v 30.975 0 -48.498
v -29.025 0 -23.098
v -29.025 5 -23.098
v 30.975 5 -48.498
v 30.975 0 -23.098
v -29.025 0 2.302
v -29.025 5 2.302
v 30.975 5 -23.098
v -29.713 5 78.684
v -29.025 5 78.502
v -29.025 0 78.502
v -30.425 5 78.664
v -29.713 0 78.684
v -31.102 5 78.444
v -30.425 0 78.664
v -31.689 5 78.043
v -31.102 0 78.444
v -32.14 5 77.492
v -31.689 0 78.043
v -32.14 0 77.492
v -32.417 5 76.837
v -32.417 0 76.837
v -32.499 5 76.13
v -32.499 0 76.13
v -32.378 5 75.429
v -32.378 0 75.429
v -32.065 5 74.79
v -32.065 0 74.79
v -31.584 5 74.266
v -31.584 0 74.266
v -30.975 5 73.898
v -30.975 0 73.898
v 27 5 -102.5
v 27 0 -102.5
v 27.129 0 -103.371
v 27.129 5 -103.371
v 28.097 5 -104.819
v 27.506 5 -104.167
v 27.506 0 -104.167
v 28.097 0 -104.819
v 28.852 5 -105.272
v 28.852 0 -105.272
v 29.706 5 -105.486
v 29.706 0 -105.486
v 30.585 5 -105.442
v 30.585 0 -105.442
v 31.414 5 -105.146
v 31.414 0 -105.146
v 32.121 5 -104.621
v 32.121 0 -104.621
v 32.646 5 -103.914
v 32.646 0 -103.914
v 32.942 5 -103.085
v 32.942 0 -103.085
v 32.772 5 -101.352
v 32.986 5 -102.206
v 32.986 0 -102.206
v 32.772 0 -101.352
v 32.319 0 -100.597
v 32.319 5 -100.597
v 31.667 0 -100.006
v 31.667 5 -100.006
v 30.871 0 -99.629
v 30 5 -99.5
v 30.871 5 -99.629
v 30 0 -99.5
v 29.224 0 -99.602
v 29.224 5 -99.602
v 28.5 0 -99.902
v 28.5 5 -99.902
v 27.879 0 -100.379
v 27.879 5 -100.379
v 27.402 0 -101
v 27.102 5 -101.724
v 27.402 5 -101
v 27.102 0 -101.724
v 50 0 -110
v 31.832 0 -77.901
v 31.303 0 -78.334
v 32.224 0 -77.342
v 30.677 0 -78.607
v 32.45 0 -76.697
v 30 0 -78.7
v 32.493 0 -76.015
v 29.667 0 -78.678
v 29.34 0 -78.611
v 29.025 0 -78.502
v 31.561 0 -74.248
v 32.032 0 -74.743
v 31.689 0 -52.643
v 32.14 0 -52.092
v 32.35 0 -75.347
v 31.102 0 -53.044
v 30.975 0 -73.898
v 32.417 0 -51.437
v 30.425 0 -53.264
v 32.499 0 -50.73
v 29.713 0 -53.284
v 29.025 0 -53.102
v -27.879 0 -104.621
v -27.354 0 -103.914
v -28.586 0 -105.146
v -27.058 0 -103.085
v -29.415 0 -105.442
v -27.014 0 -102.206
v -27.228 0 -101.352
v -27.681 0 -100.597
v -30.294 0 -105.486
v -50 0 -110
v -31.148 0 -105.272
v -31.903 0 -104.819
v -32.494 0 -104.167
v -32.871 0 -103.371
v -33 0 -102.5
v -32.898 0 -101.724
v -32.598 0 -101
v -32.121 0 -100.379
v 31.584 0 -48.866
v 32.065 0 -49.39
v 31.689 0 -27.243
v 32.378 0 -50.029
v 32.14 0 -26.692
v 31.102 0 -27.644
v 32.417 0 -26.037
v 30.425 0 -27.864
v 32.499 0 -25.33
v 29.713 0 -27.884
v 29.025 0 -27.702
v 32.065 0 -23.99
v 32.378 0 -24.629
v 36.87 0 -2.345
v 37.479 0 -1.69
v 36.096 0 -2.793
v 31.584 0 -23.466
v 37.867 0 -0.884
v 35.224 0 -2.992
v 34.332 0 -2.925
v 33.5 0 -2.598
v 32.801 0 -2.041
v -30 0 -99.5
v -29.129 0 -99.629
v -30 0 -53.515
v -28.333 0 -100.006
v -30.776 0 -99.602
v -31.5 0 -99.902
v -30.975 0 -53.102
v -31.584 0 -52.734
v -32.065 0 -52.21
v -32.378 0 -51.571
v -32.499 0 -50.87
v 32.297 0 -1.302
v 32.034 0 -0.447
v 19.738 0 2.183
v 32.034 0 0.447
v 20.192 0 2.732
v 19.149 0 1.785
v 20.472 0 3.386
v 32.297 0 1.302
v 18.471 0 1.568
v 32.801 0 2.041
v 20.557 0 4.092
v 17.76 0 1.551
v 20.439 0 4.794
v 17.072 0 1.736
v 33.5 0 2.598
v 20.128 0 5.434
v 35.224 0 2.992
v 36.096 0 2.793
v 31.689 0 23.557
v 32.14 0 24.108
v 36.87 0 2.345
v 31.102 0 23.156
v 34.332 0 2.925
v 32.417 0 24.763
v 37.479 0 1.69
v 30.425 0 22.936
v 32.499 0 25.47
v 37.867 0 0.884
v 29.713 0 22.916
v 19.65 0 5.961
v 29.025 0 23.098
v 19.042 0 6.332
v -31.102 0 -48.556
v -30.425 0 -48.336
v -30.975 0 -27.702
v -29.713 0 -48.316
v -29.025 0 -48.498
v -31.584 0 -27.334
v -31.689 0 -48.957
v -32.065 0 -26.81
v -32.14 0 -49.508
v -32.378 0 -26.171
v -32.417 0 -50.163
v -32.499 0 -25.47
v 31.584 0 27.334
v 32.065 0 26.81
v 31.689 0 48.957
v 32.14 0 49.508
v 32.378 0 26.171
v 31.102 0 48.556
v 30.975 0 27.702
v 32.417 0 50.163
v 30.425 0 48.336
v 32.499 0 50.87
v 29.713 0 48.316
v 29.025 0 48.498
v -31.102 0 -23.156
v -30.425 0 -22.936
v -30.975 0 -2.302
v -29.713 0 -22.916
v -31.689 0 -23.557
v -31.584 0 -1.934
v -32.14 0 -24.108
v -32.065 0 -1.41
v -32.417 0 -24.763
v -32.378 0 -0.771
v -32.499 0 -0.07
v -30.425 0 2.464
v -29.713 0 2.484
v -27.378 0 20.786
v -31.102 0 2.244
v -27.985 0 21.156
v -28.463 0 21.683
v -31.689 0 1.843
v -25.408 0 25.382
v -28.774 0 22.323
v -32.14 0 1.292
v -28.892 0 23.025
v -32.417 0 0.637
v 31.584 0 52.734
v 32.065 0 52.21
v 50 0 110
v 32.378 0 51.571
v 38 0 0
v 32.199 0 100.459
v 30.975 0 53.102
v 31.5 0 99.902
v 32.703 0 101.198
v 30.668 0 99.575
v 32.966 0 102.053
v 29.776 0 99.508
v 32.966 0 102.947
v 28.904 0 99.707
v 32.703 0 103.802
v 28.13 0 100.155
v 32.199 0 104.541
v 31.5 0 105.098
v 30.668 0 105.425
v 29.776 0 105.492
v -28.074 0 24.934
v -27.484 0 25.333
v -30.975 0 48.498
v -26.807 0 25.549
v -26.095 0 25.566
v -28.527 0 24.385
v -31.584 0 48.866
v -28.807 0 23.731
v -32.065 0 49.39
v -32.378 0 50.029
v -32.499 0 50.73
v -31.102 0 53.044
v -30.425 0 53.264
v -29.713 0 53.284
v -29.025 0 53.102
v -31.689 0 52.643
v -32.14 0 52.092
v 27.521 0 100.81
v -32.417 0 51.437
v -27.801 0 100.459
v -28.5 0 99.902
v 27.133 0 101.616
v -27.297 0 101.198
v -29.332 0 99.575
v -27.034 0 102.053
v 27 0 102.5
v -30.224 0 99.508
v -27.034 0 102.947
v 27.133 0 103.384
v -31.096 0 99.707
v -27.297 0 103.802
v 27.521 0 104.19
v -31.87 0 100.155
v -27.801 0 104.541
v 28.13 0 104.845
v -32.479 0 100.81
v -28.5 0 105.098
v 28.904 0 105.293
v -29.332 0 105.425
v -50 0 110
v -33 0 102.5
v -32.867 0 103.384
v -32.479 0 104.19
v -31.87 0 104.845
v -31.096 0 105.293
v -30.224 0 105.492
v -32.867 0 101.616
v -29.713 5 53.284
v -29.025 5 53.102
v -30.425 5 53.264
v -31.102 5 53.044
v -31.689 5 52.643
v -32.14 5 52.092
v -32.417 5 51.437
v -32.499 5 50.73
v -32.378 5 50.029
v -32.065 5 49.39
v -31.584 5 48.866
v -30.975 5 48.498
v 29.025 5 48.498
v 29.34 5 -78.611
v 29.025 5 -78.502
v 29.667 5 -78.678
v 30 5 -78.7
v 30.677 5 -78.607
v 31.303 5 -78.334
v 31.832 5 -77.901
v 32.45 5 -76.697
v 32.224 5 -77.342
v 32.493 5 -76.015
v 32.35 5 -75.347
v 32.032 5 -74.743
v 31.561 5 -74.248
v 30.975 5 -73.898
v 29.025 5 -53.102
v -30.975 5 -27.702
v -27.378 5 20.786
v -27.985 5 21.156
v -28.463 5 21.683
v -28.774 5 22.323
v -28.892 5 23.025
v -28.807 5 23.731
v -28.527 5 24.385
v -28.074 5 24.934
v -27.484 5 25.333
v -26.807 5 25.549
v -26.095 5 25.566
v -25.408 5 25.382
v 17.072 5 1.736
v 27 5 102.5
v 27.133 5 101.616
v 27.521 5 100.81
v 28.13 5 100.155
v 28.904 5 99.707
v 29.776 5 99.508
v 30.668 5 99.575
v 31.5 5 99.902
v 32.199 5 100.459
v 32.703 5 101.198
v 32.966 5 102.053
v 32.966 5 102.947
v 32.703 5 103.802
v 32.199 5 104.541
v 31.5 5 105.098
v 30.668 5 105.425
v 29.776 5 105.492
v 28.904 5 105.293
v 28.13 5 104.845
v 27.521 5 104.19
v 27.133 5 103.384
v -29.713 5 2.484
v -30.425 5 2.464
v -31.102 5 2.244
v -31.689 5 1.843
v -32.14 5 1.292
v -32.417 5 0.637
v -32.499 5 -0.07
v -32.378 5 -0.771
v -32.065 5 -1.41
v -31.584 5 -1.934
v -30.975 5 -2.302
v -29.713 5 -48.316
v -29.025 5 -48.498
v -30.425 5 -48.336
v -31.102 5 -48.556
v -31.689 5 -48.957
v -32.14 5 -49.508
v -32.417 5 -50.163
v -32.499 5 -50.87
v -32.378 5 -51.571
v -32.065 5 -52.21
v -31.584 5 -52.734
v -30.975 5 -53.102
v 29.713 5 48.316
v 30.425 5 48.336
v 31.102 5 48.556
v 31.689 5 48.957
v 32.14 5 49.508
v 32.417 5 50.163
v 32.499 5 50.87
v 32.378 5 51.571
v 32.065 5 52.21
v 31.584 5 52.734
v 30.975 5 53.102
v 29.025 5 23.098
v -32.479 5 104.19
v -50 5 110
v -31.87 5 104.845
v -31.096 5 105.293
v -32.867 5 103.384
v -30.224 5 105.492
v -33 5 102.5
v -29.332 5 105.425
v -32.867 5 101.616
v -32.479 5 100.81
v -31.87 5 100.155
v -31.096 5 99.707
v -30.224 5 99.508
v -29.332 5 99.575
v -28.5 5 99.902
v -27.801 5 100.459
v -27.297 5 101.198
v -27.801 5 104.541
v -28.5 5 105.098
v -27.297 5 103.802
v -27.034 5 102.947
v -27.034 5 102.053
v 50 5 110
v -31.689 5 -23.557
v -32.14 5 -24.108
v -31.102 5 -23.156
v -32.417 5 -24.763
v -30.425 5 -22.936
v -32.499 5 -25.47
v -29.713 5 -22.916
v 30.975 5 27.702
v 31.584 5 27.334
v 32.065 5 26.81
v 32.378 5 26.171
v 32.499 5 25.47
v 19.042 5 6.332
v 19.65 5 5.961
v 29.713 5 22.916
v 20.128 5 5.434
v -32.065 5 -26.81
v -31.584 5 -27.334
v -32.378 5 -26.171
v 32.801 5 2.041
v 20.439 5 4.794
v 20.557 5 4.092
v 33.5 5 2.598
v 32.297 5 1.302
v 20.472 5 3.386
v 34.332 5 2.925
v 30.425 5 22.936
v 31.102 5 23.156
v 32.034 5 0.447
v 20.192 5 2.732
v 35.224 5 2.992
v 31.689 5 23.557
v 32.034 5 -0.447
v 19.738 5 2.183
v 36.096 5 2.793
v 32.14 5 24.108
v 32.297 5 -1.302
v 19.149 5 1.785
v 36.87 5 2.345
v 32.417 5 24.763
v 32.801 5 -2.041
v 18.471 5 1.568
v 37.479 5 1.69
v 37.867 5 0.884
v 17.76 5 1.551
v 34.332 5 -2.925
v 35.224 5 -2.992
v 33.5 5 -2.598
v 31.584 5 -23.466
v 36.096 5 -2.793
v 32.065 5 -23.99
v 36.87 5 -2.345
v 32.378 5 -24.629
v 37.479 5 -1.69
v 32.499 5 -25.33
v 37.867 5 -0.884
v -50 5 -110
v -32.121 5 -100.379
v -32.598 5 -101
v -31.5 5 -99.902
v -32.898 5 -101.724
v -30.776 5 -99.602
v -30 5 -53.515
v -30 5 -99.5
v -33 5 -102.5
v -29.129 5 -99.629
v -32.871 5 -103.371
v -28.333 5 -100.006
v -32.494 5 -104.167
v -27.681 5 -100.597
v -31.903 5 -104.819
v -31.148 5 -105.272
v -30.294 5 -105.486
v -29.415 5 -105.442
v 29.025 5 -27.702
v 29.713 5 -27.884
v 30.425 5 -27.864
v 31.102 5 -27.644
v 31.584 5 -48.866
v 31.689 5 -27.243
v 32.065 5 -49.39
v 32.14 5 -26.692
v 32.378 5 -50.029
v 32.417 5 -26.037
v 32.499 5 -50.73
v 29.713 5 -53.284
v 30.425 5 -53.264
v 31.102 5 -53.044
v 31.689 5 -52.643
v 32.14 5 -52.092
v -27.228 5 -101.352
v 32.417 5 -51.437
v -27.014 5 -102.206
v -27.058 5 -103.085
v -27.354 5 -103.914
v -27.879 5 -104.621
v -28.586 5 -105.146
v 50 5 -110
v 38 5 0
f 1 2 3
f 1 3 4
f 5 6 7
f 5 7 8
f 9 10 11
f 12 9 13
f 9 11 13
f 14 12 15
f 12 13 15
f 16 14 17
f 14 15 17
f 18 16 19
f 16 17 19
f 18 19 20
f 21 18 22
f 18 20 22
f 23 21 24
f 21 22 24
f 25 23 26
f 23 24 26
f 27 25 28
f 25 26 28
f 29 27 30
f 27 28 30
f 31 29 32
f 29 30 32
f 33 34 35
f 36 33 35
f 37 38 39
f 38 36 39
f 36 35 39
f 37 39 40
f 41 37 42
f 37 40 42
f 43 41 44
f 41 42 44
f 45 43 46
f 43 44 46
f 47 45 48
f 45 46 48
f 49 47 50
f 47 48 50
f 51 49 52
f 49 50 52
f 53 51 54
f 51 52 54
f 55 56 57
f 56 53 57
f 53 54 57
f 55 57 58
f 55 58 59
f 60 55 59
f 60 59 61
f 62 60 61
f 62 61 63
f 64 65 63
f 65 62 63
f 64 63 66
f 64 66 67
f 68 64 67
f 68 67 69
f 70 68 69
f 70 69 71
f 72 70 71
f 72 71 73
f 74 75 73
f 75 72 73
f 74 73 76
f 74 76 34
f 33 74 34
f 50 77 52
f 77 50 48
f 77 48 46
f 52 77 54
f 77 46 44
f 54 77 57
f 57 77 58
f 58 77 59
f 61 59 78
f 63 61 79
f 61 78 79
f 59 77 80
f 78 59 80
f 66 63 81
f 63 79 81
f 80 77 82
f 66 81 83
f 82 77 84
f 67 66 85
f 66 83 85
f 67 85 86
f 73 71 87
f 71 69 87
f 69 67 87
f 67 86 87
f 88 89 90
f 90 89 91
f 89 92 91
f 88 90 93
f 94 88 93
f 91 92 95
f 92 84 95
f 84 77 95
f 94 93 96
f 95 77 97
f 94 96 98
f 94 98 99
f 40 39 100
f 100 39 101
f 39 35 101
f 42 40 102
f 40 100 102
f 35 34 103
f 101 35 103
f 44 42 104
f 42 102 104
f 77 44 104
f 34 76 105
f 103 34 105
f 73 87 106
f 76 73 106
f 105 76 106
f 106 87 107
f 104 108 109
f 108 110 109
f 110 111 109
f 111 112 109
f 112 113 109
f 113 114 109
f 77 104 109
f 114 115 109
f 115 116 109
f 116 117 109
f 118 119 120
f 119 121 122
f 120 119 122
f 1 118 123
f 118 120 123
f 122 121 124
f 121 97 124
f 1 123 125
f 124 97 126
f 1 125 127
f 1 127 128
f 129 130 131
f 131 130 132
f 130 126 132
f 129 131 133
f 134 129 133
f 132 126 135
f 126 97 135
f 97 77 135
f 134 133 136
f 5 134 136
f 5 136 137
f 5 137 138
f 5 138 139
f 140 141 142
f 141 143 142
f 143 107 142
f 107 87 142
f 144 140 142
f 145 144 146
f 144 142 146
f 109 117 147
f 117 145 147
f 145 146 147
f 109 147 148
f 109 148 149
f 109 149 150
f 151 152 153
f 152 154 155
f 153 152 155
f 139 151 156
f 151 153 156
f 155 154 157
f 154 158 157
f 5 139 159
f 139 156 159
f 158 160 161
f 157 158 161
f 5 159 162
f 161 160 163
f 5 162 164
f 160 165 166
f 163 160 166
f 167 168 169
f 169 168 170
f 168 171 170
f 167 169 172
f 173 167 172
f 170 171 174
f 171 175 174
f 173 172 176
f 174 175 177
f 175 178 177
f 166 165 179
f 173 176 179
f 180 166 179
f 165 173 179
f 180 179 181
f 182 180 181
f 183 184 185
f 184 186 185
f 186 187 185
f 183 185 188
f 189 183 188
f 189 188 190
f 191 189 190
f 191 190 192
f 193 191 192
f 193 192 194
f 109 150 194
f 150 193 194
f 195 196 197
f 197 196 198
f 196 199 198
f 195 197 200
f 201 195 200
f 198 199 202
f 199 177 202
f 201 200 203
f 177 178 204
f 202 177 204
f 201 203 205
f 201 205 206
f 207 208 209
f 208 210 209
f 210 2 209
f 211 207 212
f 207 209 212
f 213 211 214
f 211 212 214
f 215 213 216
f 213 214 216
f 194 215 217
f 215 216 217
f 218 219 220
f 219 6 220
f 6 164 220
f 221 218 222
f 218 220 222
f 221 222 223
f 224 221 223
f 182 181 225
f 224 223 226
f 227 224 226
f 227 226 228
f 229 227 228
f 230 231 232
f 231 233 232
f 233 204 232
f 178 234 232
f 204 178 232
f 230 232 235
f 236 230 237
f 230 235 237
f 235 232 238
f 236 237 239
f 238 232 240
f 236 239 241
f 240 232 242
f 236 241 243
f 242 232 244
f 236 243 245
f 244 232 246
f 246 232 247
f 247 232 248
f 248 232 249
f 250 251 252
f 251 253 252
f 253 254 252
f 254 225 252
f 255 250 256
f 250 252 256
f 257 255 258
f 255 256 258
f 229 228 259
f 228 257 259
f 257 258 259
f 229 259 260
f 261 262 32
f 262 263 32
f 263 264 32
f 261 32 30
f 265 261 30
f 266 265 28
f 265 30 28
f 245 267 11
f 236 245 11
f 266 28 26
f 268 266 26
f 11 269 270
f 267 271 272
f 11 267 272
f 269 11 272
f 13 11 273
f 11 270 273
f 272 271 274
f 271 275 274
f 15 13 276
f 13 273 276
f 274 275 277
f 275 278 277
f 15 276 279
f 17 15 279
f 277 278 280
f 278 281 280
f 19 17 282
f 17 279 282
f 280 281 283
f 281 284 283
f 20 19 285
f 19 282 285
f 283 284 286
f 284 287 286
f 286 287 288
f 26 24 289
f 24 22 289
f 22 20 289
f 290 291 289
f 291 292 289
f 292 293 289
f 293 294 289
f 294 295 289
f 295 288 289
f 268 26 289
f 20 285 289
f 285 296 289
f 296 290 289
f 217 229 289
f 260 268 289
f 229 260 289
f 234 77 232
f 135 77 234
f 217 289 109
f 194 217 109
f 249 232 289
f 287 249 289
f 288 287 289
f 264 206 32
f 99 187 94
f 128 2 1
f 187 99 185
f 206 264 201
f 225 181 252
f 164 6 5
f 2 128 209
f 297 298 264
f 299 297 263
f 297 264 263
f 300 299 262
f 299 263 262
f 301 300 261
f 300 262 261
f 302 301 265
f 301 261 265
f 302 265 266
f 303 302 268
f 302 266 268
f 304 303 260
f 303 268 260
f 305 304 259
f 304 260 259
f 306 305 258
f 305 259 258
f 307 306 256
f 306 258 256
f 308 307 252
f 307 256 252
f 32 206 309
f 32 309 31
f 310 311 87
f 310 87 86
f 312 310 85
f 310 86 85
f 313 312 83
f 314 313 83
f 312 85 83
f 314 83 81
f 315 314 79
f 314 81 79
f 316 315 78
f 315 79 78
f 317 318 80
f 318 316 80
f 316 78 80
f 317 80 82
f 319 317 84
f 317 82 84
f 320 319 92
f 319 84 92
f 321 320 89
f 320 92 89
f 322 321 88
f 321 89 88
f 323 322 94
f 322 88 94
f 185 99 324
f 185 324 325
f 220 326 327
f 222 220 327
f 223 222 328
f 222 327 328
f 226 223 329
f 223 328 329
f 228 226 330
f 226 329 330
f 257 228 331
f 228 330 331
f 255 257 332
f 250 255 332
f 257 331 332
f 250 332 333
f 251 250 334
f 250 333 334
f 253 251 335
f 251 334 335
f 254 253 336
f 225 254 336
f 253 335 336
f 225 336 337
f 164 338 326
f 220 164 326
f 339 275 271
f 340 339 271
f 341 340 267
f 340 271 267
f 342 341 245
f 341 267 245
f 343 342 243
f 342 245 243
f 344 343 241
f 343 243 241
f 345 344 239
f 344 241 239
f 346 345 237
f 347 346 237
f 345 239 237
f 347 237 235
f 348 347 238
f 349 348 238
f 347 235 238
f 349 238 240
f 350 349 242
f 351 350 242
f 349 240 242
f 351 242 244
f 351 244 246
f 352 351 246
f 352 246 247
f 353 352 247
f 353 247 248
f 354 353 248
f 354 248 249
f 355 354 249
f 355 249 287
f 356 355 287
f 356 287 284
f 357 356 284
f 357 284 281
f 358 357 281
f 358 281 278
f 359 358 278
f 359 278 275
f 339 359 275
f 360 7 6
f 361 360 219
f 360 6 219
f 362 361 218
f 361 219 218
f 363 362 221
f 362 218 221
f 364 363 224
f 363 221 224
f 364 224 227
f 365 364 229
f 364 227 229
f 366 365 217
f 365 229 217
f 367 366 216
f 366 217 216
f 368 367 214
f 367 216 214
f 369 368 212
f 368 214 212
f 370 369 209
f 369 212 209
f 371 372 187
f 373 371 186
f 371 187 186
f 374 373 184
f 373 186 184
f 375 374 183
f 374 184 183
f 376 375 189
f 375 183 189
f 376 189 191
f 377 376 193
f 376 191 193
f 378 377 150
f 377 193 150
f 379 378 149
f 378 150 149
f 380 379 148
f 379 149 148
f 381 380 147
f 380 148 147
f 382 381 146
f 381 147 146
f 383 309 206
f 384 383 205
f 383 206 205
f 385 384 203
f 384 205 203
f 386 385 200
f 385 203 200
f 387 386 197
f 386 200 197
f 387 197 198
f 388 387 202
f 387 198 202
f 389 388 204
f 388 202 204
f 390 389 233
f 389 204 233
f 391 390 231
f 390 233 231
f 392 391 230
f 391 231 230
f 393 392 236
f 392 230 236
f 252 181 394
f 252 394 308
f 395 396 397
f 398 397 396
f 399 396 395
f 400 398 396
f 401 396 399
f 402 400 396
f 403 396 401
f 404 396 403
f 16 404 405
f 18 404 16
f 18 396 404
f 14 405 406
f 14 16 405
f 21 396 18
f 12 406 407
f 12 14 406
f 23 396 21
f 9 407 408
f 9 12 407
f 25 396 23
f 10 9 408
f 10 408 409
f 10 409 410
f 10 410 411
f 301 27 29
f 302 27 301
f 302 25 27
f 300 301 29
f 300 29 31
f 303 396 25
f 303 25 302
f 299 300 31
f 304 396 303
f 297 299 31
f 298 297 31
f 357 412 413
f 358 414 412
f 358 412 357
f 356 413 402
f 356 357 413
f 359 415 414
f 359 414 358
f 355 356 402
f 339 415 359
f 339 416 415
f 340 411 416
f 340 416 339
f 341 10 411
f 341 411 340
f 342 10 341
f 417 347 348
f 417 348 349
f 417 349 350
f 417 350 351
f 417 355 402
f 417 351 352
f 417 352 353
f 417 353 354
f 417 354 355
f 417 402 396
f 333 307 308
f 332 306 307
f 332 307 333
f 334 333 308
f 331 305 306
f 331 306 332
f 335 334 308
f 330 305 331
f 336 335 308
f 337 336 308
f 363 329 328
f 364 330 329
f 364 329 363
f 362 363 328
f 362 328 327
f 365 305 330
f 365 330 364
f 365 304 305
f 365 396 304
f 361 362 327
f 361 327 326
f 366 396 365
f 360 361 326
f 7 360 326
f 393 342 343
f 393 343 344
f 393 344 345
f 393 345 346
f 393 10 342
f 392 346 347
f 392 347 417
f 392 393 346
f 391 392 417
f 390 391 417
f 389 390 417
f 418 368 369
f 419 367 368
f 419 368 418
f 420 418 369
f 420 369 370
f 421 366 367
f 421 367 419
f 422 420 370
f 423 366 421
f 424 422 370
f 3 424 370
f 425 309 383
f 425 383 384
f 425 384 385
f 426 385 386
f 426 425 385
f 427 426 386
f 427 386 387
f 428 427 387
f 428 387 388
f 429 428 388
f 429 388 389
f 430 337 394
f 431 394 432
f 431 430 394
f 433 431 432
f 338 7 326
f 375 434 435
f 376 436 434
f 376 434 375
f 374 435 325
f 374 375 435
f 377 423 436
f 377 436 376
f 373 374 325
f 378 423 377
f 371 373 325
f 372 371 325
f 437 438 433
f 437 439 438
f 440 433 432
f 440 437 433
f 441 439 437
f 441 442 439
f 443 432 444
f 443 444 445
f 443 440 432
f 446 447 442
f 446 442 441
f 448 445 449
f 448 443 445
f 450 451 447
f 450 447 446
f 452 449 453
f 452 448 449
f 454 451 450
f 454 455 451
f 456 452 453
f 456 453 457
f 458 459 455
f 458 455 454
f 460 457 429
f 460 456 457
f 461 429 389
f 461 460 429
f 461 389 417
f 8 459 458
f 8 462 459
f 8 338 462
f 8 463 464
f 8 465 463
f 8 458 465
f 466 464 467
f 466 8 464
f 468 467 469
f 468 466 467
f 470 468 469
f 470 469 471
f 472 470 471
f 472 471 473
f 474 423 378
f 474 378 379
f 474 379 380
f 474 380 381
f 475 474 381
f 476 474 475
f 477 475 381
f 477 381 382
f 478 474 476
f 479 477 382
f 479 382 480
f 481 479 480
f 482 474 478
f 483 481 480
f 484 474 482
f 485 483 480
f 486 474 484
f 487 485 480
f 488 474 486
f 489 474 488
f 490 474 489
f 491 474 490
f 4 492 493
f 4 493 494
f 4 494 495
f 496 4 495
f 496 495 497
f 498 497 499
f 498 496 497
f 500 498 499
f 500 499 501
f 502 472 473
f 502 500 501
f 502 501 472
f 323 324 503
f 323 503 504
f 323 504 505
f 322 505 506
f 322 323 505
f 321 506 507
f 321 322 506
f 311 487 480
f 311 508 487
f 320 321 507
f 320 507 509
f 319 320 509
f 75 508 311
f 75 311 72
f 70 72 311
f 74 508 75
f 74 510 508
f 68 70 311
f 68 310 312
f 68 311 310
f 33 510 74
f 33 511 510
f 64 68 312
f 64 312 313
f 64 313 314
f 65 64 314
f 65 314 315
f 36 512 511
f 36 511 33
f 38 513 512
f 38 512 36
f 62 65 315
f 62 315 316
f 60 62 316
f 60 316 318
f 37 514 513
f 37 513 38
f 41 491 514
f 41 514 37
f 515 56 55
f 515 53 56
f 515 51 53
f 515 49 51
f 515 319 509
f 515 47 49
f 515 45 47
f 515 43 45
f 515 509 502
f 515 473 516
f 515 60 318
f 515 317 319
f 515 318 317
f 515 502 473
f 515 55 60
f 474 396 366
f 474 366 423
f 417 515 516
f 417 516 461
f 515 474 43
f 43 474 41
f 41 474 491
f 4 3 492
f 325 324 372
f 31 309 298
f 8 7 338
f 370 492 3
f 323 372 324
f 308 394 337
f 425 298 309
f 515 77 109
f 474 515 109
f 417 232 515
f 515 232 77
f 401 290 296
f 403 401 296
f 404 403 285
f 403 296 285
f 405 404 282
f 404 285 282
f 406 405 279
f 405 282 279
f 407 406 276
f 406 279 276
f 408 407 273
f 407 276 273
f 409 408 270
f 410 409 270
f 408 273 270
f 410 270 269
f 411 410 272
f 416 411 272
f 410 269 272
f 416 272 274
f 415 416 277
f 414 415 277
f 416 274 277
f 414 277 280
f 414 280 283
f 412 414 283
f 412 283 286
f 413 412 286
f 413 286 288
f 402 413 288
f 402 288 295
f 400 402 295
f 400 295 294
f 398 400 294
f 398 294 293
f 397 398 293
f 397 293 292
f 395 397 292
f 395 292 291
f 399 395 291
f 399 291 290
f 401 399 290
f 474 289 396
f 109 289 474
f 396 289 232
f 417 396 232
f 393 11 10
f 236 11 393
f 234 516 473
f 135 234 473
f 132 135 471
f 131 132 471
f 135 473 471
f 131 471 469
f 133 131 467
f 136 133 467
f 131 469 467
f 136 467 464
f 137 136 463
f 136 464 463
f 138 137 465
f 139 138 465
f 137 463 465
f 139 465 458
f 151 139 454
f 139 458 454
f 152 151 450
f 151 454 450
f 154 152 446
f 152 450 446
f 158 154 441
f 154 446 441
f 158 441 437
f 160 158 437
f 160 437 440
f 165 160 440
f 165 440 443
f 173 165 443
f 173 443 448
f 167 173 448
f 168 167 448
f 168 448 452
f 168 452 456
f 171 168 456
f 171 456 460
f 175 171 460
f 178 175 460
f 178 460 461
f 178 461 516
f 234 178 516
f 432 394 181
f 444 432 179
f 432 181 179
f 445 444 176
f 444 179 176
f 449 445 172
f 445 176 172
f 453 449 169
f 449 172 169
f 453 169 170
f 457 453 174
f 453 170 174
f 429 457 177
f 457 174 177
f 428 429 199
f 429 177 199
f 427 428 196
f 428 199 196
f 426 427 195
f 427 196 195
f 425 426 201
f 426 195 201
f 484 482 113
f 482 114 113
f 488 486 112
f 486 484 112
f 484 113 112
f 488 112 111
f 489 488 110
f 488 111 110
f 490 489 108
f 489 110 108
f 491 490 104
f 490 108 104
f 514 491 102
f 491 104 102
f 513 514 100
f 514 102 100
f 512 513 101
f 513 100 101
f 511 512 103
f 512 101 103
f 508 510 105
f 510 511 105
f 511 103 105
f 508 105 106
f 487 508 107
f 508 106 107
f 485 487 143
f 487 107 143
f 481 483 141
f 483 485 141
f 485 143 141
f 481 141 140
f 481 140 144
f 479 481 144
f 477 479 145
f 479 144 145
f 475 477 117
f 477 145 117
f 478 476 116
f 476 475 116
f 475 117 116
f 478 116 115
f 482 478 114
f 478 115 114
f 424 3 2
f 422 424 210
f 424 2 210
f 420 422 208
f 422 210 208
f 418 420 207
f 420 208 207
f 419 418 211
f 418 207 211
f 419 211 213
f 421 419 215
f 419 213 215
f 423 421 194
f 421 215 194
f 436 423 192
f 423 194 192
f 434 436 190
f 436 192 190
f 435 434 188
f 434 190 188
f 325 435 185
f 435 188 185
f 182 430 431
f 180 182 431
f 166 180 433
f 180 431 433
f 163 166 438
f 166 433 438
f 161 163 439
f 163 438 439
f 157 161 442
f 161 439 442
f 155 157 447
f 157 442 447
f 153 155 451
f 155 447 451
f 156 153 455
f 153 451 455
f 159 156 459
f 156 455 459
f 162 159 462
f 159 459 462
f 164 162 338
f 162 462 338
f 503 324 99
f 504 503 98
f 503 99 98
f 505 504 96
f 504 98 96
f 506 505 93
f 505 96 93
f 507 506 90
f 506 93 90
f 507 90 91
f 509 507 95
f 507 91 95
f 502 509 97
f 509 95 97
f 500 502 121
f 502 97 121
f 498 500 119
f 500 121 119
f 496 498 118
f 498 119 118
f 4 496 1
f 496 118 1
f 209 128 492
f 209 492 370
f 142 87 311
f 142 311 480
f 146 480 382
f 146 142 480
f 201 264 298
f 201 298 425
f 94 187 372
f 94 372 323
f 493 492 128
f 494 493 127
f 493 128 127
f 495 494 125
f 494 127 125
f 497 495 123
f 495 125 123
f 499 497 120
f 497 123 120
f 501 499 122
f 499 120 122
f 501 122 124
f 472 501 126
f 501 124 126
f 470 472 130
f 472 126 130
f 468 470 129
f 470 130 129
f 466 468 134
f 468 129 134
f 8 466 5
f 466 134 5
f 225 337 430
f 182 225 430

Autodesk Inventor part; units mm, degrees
ref_plane "YZ Plane" through (0, 0, 0) normal (1, 0, 0) x (0, 1, 0)
ref_plane "XZ Plane" through (0, 0, 0) normal (0, 1, 0) x (-1, 0, 0)
ref_plane "XY Plane" through (0, 0, 0) normal (0, 0, 1) x (1, 0, 0)
sketch "Sketch1" plane through (0, 0, 0) normal (0, 1, 0) x (-1, 0, 0)
  line L0 (0, 0) -> (0, 110)
  line L1 (0, 110) -> (50, 110)
  line L2 (50, 110) -> (50, -110)
  line L3 (50, -110) -> (0, -110)
  line L4 (0, -110) -> (0, 0)
  line L5 (50, 0) -> (0, 0)
  line L6 (50, 110) -> (50, 102.5)
  line L7 (50, 102.5) -> (30, 102.5)
  line L8 (0, 110) -> (-50, 110)
  line L9 (-50, 110) -> (-50, -110)
  line L10 (-50, -110) -> (0, -110)
  circle A0 centre (30, 102.5) radius 3
  line L11 (30, 102.5) -> (-30, 102.5)
  circle A1 centre (-30, 102.5) radius 3
  circle A2 centre (30, -102.5) radius 3
  circle A3 centre (-30, -102.5) radius 3
  line L12 (30, 102.5) -> (30, -102.5)
  line L13 (-30, 102.5) -> (-30, -102.5)
  line L14 (30, 76.2) -> (-30, 50.8) construction
  line L15 (29.0254, 78.5022) -> (-30.9746, 53.1022)
  line L16 (-29.0254, 48.4978) -> (30.9746, 73.8978)
  arc A4 (30.9746, 73.8978) -> (29.0254, 78.5022) centre (30, 76.2) ccw
  arc A5 (-30.9746, 53.1022) -> (-29.0254, 48.4978) centre (-30, 50.8) ccw
  line L17 (30, 50.8) -> (-30, 25.4) construction
  line L18 (29.0254, 53.1022) -> (-30.9746, 27.7022)
  line L19 (-29.0254, 23.0978) -> (30.9746, 48.4978)
  arc A6 (30.9746, 48.4978) -> (29.0254, 53.1022) centre (30, 50.8) ccw
  arc A7 (-30.9746, 27.7022) -> (-29.0254, 23.0978) centre (-30, 25.4) ccw
  line L20 (30, 25.4) -> (-30, 0) construction
  line L21 (29.0254, 27.7022) -> (-30.9746, 2.3022)
  line L22 (-29.0254, -2.3022) -> (30.9746, 23.0978)
  arc A8 (30.9746, 23.0978) -> (29.0254, 27.7022) centre (30, 25.4) ccw
  arc A9 (-30.9746, 2.3022) -> (-29.0254, -2.3022) centre (-30, 0) ccw
  line L23 (30, 0) -> (-30, -25.4) construction
  line L24 (29.0254, 2.3022) -> (-30.9746, -23.0978)
  line L25 (-29.0254, -27.7022) -> (30.9746, -2.3022)
  arc A10 (30.9746, -2.3022) -> (29.0254, 2.3022) centre (30, 0) ccw
  arc A11 (-30.9746, -23.0978) -> (-29.0254, -27.7022) centre (-30, -25.4) ccw
  line L26 (30, -25.4) -> (-30, -50.8) construction
  line L27 (29.0254, -23.0978) -> (-30.9746, -48.4978)
  line L28 (-29.0254, -53.1022) -> (30.9746, -27.7022)
  arc A12 (30.9746, -27.7022) -> (29.0254, -23.0978) centre (30, -25.4) ccw
  arc A13 (-30.9746, -48.4978) -> (-29.0254, -53.1022) centre (-30, -50.8) ccw
  line L29 (30, -50.8) -> (-30, -76.2) construction
  line L30 (29.0254, -48.4978) -> (-30.9746, -73.8978)
  line L31 (-29.0254, -78.5022) -> (30.9746, -53.1022)
  arc A14 (30.9746, -53.1022) -> (29.0254, -48.4978) centre (30, -50.8) ccw
  arc A15 (-30.9746, -73.8978) -> (-29.0254, -78.5022) centre (-30, -76.2) ccw
  point P0 (0, 63.5)
  point P1 (0, 38.1)
  point P2 (0, 12.7)
  point P3 (0, -12.7)
  point P4 (0, -38.1)
  point P5 (0, -63.5)
  dimension "d0" = 110
  dimension "d1" = 50
  dimension "d2" = 220
  dimension "d3" = 7.5
  dimension "d4" = 20
  dimension "d5" = 50
  dimension "d6" = 6
  dimension "d7" = 60
  dimension "d8" = 6
  dimension "d9" = 5
  dimension "d10" = 5
  dimension "d11" = 5
  dimension "d12" = 5
  dimension "d13" = 5
  dimension "d14" = 5
extrude "Extrusion1" add sketch "Sketch1" along normal blind 5 contours L4 L24 L13 A9 L22 L0 | L5 L24 L4 | L0 L22 L12 A10 L24 L5 | L21 L13 A7 L19 L0 | L0 L19 L12 A8 L21 | L22 A8 L12 L19 A6 L16 A4 A0 L7 L2 L5 A10 | L25 L12 A12 L27 L4 | L4 L27 L13 A11 L25 | L24 A11 L13 L27 A13 L30 A15 L31 L4 L10 L9 L8 L0 L11 A1 L15 A5 L18 A7 L21 A9 | L25 A10 L5 L2 L3 L4 L31 A14 L12 L28 A12 | L18 L13 A5 L16 L0 | L0 L16 L12 A6 L18 | L28 L12 A14 L30 L4 | L4 L30 L13 A13 L28 | L7 A0 L11 L0 L1 L2 | L15 L13 A1 L11 L0 | L0 L11 A0 L12 A4 L15
sketch "Sketch2" plane through (0, 5, 0) normal (0, 1, 0) x (1, 0, 0)
  line L0 (-30.9746, -23.0978) -> (29.0254, 2.3022) projected
  line L1 (29.0254, 2.3022) -> (-30.9746, -23.0978)
  line L2 (30.9746, -2.3022) -> (-29.0254, -27.7022) projected
  line L3 (30.9746, -2.3022) -> (-29.0254, -27.7022)
  arc A0 (30.9746, -2.3022) -> (29.0254, 2.3022) centre (30, 0) ccw projected
  arc A1 (30.9746, -2.3022) -> (29.0254, 2.3022) centre (30, 0) ccw
  arc A2 (-30.9746, -23.0978) -> (-29.0254, -27.7022) centre (-30, -25.4) ccw projected
  arc A3 (-30.9746, -23.0978) -> (-29.0254, -27.7022) centre (-30, -25.4) ccw
  point P0 (0, 0)
extrude "Extrusion2" add sketch "Sketch2" against normal blind 5
sketch "Sketch3" plane through (0, 5, 0) normal (0, 1, 0) x (1, 0, 0)
  line L0 (50, -110) -> (50, 110) projected
  line L1 (50, 110) -> (50, 0)
  line L2 (50, 0) -> (35, 0)
  circle A0 centre (35, 0) radius 3
  line L3 (-26.3927, -23.0836) -> (18.0573, -4.0336) construction
  line L4 (-25.4079, -25.3815) -> (19.0421, -6.3315)
  line L5 (17.0725, -1.7358) -> (-27.3775, -20.7858)
  arc A1 (-27.3775, -20.7858) -> (-25.4079, -25.3815) centre (-26.3927, -23.0836) ccw
  arc A2 (19.0421, -6.3315) -> (17.0725, -1.7358) centre (18.0573, -4.0336) ccw
  point P0 (0, 0)
  point P1 (-4.1677, -13.5586)
  dimension "d19" = 15
  dimension "d20" = 6
  dimension "d21" = 5
extrude "Extrusion3" cut sketch "Sketch3" against normal blind 5
properties part number "left_side"
